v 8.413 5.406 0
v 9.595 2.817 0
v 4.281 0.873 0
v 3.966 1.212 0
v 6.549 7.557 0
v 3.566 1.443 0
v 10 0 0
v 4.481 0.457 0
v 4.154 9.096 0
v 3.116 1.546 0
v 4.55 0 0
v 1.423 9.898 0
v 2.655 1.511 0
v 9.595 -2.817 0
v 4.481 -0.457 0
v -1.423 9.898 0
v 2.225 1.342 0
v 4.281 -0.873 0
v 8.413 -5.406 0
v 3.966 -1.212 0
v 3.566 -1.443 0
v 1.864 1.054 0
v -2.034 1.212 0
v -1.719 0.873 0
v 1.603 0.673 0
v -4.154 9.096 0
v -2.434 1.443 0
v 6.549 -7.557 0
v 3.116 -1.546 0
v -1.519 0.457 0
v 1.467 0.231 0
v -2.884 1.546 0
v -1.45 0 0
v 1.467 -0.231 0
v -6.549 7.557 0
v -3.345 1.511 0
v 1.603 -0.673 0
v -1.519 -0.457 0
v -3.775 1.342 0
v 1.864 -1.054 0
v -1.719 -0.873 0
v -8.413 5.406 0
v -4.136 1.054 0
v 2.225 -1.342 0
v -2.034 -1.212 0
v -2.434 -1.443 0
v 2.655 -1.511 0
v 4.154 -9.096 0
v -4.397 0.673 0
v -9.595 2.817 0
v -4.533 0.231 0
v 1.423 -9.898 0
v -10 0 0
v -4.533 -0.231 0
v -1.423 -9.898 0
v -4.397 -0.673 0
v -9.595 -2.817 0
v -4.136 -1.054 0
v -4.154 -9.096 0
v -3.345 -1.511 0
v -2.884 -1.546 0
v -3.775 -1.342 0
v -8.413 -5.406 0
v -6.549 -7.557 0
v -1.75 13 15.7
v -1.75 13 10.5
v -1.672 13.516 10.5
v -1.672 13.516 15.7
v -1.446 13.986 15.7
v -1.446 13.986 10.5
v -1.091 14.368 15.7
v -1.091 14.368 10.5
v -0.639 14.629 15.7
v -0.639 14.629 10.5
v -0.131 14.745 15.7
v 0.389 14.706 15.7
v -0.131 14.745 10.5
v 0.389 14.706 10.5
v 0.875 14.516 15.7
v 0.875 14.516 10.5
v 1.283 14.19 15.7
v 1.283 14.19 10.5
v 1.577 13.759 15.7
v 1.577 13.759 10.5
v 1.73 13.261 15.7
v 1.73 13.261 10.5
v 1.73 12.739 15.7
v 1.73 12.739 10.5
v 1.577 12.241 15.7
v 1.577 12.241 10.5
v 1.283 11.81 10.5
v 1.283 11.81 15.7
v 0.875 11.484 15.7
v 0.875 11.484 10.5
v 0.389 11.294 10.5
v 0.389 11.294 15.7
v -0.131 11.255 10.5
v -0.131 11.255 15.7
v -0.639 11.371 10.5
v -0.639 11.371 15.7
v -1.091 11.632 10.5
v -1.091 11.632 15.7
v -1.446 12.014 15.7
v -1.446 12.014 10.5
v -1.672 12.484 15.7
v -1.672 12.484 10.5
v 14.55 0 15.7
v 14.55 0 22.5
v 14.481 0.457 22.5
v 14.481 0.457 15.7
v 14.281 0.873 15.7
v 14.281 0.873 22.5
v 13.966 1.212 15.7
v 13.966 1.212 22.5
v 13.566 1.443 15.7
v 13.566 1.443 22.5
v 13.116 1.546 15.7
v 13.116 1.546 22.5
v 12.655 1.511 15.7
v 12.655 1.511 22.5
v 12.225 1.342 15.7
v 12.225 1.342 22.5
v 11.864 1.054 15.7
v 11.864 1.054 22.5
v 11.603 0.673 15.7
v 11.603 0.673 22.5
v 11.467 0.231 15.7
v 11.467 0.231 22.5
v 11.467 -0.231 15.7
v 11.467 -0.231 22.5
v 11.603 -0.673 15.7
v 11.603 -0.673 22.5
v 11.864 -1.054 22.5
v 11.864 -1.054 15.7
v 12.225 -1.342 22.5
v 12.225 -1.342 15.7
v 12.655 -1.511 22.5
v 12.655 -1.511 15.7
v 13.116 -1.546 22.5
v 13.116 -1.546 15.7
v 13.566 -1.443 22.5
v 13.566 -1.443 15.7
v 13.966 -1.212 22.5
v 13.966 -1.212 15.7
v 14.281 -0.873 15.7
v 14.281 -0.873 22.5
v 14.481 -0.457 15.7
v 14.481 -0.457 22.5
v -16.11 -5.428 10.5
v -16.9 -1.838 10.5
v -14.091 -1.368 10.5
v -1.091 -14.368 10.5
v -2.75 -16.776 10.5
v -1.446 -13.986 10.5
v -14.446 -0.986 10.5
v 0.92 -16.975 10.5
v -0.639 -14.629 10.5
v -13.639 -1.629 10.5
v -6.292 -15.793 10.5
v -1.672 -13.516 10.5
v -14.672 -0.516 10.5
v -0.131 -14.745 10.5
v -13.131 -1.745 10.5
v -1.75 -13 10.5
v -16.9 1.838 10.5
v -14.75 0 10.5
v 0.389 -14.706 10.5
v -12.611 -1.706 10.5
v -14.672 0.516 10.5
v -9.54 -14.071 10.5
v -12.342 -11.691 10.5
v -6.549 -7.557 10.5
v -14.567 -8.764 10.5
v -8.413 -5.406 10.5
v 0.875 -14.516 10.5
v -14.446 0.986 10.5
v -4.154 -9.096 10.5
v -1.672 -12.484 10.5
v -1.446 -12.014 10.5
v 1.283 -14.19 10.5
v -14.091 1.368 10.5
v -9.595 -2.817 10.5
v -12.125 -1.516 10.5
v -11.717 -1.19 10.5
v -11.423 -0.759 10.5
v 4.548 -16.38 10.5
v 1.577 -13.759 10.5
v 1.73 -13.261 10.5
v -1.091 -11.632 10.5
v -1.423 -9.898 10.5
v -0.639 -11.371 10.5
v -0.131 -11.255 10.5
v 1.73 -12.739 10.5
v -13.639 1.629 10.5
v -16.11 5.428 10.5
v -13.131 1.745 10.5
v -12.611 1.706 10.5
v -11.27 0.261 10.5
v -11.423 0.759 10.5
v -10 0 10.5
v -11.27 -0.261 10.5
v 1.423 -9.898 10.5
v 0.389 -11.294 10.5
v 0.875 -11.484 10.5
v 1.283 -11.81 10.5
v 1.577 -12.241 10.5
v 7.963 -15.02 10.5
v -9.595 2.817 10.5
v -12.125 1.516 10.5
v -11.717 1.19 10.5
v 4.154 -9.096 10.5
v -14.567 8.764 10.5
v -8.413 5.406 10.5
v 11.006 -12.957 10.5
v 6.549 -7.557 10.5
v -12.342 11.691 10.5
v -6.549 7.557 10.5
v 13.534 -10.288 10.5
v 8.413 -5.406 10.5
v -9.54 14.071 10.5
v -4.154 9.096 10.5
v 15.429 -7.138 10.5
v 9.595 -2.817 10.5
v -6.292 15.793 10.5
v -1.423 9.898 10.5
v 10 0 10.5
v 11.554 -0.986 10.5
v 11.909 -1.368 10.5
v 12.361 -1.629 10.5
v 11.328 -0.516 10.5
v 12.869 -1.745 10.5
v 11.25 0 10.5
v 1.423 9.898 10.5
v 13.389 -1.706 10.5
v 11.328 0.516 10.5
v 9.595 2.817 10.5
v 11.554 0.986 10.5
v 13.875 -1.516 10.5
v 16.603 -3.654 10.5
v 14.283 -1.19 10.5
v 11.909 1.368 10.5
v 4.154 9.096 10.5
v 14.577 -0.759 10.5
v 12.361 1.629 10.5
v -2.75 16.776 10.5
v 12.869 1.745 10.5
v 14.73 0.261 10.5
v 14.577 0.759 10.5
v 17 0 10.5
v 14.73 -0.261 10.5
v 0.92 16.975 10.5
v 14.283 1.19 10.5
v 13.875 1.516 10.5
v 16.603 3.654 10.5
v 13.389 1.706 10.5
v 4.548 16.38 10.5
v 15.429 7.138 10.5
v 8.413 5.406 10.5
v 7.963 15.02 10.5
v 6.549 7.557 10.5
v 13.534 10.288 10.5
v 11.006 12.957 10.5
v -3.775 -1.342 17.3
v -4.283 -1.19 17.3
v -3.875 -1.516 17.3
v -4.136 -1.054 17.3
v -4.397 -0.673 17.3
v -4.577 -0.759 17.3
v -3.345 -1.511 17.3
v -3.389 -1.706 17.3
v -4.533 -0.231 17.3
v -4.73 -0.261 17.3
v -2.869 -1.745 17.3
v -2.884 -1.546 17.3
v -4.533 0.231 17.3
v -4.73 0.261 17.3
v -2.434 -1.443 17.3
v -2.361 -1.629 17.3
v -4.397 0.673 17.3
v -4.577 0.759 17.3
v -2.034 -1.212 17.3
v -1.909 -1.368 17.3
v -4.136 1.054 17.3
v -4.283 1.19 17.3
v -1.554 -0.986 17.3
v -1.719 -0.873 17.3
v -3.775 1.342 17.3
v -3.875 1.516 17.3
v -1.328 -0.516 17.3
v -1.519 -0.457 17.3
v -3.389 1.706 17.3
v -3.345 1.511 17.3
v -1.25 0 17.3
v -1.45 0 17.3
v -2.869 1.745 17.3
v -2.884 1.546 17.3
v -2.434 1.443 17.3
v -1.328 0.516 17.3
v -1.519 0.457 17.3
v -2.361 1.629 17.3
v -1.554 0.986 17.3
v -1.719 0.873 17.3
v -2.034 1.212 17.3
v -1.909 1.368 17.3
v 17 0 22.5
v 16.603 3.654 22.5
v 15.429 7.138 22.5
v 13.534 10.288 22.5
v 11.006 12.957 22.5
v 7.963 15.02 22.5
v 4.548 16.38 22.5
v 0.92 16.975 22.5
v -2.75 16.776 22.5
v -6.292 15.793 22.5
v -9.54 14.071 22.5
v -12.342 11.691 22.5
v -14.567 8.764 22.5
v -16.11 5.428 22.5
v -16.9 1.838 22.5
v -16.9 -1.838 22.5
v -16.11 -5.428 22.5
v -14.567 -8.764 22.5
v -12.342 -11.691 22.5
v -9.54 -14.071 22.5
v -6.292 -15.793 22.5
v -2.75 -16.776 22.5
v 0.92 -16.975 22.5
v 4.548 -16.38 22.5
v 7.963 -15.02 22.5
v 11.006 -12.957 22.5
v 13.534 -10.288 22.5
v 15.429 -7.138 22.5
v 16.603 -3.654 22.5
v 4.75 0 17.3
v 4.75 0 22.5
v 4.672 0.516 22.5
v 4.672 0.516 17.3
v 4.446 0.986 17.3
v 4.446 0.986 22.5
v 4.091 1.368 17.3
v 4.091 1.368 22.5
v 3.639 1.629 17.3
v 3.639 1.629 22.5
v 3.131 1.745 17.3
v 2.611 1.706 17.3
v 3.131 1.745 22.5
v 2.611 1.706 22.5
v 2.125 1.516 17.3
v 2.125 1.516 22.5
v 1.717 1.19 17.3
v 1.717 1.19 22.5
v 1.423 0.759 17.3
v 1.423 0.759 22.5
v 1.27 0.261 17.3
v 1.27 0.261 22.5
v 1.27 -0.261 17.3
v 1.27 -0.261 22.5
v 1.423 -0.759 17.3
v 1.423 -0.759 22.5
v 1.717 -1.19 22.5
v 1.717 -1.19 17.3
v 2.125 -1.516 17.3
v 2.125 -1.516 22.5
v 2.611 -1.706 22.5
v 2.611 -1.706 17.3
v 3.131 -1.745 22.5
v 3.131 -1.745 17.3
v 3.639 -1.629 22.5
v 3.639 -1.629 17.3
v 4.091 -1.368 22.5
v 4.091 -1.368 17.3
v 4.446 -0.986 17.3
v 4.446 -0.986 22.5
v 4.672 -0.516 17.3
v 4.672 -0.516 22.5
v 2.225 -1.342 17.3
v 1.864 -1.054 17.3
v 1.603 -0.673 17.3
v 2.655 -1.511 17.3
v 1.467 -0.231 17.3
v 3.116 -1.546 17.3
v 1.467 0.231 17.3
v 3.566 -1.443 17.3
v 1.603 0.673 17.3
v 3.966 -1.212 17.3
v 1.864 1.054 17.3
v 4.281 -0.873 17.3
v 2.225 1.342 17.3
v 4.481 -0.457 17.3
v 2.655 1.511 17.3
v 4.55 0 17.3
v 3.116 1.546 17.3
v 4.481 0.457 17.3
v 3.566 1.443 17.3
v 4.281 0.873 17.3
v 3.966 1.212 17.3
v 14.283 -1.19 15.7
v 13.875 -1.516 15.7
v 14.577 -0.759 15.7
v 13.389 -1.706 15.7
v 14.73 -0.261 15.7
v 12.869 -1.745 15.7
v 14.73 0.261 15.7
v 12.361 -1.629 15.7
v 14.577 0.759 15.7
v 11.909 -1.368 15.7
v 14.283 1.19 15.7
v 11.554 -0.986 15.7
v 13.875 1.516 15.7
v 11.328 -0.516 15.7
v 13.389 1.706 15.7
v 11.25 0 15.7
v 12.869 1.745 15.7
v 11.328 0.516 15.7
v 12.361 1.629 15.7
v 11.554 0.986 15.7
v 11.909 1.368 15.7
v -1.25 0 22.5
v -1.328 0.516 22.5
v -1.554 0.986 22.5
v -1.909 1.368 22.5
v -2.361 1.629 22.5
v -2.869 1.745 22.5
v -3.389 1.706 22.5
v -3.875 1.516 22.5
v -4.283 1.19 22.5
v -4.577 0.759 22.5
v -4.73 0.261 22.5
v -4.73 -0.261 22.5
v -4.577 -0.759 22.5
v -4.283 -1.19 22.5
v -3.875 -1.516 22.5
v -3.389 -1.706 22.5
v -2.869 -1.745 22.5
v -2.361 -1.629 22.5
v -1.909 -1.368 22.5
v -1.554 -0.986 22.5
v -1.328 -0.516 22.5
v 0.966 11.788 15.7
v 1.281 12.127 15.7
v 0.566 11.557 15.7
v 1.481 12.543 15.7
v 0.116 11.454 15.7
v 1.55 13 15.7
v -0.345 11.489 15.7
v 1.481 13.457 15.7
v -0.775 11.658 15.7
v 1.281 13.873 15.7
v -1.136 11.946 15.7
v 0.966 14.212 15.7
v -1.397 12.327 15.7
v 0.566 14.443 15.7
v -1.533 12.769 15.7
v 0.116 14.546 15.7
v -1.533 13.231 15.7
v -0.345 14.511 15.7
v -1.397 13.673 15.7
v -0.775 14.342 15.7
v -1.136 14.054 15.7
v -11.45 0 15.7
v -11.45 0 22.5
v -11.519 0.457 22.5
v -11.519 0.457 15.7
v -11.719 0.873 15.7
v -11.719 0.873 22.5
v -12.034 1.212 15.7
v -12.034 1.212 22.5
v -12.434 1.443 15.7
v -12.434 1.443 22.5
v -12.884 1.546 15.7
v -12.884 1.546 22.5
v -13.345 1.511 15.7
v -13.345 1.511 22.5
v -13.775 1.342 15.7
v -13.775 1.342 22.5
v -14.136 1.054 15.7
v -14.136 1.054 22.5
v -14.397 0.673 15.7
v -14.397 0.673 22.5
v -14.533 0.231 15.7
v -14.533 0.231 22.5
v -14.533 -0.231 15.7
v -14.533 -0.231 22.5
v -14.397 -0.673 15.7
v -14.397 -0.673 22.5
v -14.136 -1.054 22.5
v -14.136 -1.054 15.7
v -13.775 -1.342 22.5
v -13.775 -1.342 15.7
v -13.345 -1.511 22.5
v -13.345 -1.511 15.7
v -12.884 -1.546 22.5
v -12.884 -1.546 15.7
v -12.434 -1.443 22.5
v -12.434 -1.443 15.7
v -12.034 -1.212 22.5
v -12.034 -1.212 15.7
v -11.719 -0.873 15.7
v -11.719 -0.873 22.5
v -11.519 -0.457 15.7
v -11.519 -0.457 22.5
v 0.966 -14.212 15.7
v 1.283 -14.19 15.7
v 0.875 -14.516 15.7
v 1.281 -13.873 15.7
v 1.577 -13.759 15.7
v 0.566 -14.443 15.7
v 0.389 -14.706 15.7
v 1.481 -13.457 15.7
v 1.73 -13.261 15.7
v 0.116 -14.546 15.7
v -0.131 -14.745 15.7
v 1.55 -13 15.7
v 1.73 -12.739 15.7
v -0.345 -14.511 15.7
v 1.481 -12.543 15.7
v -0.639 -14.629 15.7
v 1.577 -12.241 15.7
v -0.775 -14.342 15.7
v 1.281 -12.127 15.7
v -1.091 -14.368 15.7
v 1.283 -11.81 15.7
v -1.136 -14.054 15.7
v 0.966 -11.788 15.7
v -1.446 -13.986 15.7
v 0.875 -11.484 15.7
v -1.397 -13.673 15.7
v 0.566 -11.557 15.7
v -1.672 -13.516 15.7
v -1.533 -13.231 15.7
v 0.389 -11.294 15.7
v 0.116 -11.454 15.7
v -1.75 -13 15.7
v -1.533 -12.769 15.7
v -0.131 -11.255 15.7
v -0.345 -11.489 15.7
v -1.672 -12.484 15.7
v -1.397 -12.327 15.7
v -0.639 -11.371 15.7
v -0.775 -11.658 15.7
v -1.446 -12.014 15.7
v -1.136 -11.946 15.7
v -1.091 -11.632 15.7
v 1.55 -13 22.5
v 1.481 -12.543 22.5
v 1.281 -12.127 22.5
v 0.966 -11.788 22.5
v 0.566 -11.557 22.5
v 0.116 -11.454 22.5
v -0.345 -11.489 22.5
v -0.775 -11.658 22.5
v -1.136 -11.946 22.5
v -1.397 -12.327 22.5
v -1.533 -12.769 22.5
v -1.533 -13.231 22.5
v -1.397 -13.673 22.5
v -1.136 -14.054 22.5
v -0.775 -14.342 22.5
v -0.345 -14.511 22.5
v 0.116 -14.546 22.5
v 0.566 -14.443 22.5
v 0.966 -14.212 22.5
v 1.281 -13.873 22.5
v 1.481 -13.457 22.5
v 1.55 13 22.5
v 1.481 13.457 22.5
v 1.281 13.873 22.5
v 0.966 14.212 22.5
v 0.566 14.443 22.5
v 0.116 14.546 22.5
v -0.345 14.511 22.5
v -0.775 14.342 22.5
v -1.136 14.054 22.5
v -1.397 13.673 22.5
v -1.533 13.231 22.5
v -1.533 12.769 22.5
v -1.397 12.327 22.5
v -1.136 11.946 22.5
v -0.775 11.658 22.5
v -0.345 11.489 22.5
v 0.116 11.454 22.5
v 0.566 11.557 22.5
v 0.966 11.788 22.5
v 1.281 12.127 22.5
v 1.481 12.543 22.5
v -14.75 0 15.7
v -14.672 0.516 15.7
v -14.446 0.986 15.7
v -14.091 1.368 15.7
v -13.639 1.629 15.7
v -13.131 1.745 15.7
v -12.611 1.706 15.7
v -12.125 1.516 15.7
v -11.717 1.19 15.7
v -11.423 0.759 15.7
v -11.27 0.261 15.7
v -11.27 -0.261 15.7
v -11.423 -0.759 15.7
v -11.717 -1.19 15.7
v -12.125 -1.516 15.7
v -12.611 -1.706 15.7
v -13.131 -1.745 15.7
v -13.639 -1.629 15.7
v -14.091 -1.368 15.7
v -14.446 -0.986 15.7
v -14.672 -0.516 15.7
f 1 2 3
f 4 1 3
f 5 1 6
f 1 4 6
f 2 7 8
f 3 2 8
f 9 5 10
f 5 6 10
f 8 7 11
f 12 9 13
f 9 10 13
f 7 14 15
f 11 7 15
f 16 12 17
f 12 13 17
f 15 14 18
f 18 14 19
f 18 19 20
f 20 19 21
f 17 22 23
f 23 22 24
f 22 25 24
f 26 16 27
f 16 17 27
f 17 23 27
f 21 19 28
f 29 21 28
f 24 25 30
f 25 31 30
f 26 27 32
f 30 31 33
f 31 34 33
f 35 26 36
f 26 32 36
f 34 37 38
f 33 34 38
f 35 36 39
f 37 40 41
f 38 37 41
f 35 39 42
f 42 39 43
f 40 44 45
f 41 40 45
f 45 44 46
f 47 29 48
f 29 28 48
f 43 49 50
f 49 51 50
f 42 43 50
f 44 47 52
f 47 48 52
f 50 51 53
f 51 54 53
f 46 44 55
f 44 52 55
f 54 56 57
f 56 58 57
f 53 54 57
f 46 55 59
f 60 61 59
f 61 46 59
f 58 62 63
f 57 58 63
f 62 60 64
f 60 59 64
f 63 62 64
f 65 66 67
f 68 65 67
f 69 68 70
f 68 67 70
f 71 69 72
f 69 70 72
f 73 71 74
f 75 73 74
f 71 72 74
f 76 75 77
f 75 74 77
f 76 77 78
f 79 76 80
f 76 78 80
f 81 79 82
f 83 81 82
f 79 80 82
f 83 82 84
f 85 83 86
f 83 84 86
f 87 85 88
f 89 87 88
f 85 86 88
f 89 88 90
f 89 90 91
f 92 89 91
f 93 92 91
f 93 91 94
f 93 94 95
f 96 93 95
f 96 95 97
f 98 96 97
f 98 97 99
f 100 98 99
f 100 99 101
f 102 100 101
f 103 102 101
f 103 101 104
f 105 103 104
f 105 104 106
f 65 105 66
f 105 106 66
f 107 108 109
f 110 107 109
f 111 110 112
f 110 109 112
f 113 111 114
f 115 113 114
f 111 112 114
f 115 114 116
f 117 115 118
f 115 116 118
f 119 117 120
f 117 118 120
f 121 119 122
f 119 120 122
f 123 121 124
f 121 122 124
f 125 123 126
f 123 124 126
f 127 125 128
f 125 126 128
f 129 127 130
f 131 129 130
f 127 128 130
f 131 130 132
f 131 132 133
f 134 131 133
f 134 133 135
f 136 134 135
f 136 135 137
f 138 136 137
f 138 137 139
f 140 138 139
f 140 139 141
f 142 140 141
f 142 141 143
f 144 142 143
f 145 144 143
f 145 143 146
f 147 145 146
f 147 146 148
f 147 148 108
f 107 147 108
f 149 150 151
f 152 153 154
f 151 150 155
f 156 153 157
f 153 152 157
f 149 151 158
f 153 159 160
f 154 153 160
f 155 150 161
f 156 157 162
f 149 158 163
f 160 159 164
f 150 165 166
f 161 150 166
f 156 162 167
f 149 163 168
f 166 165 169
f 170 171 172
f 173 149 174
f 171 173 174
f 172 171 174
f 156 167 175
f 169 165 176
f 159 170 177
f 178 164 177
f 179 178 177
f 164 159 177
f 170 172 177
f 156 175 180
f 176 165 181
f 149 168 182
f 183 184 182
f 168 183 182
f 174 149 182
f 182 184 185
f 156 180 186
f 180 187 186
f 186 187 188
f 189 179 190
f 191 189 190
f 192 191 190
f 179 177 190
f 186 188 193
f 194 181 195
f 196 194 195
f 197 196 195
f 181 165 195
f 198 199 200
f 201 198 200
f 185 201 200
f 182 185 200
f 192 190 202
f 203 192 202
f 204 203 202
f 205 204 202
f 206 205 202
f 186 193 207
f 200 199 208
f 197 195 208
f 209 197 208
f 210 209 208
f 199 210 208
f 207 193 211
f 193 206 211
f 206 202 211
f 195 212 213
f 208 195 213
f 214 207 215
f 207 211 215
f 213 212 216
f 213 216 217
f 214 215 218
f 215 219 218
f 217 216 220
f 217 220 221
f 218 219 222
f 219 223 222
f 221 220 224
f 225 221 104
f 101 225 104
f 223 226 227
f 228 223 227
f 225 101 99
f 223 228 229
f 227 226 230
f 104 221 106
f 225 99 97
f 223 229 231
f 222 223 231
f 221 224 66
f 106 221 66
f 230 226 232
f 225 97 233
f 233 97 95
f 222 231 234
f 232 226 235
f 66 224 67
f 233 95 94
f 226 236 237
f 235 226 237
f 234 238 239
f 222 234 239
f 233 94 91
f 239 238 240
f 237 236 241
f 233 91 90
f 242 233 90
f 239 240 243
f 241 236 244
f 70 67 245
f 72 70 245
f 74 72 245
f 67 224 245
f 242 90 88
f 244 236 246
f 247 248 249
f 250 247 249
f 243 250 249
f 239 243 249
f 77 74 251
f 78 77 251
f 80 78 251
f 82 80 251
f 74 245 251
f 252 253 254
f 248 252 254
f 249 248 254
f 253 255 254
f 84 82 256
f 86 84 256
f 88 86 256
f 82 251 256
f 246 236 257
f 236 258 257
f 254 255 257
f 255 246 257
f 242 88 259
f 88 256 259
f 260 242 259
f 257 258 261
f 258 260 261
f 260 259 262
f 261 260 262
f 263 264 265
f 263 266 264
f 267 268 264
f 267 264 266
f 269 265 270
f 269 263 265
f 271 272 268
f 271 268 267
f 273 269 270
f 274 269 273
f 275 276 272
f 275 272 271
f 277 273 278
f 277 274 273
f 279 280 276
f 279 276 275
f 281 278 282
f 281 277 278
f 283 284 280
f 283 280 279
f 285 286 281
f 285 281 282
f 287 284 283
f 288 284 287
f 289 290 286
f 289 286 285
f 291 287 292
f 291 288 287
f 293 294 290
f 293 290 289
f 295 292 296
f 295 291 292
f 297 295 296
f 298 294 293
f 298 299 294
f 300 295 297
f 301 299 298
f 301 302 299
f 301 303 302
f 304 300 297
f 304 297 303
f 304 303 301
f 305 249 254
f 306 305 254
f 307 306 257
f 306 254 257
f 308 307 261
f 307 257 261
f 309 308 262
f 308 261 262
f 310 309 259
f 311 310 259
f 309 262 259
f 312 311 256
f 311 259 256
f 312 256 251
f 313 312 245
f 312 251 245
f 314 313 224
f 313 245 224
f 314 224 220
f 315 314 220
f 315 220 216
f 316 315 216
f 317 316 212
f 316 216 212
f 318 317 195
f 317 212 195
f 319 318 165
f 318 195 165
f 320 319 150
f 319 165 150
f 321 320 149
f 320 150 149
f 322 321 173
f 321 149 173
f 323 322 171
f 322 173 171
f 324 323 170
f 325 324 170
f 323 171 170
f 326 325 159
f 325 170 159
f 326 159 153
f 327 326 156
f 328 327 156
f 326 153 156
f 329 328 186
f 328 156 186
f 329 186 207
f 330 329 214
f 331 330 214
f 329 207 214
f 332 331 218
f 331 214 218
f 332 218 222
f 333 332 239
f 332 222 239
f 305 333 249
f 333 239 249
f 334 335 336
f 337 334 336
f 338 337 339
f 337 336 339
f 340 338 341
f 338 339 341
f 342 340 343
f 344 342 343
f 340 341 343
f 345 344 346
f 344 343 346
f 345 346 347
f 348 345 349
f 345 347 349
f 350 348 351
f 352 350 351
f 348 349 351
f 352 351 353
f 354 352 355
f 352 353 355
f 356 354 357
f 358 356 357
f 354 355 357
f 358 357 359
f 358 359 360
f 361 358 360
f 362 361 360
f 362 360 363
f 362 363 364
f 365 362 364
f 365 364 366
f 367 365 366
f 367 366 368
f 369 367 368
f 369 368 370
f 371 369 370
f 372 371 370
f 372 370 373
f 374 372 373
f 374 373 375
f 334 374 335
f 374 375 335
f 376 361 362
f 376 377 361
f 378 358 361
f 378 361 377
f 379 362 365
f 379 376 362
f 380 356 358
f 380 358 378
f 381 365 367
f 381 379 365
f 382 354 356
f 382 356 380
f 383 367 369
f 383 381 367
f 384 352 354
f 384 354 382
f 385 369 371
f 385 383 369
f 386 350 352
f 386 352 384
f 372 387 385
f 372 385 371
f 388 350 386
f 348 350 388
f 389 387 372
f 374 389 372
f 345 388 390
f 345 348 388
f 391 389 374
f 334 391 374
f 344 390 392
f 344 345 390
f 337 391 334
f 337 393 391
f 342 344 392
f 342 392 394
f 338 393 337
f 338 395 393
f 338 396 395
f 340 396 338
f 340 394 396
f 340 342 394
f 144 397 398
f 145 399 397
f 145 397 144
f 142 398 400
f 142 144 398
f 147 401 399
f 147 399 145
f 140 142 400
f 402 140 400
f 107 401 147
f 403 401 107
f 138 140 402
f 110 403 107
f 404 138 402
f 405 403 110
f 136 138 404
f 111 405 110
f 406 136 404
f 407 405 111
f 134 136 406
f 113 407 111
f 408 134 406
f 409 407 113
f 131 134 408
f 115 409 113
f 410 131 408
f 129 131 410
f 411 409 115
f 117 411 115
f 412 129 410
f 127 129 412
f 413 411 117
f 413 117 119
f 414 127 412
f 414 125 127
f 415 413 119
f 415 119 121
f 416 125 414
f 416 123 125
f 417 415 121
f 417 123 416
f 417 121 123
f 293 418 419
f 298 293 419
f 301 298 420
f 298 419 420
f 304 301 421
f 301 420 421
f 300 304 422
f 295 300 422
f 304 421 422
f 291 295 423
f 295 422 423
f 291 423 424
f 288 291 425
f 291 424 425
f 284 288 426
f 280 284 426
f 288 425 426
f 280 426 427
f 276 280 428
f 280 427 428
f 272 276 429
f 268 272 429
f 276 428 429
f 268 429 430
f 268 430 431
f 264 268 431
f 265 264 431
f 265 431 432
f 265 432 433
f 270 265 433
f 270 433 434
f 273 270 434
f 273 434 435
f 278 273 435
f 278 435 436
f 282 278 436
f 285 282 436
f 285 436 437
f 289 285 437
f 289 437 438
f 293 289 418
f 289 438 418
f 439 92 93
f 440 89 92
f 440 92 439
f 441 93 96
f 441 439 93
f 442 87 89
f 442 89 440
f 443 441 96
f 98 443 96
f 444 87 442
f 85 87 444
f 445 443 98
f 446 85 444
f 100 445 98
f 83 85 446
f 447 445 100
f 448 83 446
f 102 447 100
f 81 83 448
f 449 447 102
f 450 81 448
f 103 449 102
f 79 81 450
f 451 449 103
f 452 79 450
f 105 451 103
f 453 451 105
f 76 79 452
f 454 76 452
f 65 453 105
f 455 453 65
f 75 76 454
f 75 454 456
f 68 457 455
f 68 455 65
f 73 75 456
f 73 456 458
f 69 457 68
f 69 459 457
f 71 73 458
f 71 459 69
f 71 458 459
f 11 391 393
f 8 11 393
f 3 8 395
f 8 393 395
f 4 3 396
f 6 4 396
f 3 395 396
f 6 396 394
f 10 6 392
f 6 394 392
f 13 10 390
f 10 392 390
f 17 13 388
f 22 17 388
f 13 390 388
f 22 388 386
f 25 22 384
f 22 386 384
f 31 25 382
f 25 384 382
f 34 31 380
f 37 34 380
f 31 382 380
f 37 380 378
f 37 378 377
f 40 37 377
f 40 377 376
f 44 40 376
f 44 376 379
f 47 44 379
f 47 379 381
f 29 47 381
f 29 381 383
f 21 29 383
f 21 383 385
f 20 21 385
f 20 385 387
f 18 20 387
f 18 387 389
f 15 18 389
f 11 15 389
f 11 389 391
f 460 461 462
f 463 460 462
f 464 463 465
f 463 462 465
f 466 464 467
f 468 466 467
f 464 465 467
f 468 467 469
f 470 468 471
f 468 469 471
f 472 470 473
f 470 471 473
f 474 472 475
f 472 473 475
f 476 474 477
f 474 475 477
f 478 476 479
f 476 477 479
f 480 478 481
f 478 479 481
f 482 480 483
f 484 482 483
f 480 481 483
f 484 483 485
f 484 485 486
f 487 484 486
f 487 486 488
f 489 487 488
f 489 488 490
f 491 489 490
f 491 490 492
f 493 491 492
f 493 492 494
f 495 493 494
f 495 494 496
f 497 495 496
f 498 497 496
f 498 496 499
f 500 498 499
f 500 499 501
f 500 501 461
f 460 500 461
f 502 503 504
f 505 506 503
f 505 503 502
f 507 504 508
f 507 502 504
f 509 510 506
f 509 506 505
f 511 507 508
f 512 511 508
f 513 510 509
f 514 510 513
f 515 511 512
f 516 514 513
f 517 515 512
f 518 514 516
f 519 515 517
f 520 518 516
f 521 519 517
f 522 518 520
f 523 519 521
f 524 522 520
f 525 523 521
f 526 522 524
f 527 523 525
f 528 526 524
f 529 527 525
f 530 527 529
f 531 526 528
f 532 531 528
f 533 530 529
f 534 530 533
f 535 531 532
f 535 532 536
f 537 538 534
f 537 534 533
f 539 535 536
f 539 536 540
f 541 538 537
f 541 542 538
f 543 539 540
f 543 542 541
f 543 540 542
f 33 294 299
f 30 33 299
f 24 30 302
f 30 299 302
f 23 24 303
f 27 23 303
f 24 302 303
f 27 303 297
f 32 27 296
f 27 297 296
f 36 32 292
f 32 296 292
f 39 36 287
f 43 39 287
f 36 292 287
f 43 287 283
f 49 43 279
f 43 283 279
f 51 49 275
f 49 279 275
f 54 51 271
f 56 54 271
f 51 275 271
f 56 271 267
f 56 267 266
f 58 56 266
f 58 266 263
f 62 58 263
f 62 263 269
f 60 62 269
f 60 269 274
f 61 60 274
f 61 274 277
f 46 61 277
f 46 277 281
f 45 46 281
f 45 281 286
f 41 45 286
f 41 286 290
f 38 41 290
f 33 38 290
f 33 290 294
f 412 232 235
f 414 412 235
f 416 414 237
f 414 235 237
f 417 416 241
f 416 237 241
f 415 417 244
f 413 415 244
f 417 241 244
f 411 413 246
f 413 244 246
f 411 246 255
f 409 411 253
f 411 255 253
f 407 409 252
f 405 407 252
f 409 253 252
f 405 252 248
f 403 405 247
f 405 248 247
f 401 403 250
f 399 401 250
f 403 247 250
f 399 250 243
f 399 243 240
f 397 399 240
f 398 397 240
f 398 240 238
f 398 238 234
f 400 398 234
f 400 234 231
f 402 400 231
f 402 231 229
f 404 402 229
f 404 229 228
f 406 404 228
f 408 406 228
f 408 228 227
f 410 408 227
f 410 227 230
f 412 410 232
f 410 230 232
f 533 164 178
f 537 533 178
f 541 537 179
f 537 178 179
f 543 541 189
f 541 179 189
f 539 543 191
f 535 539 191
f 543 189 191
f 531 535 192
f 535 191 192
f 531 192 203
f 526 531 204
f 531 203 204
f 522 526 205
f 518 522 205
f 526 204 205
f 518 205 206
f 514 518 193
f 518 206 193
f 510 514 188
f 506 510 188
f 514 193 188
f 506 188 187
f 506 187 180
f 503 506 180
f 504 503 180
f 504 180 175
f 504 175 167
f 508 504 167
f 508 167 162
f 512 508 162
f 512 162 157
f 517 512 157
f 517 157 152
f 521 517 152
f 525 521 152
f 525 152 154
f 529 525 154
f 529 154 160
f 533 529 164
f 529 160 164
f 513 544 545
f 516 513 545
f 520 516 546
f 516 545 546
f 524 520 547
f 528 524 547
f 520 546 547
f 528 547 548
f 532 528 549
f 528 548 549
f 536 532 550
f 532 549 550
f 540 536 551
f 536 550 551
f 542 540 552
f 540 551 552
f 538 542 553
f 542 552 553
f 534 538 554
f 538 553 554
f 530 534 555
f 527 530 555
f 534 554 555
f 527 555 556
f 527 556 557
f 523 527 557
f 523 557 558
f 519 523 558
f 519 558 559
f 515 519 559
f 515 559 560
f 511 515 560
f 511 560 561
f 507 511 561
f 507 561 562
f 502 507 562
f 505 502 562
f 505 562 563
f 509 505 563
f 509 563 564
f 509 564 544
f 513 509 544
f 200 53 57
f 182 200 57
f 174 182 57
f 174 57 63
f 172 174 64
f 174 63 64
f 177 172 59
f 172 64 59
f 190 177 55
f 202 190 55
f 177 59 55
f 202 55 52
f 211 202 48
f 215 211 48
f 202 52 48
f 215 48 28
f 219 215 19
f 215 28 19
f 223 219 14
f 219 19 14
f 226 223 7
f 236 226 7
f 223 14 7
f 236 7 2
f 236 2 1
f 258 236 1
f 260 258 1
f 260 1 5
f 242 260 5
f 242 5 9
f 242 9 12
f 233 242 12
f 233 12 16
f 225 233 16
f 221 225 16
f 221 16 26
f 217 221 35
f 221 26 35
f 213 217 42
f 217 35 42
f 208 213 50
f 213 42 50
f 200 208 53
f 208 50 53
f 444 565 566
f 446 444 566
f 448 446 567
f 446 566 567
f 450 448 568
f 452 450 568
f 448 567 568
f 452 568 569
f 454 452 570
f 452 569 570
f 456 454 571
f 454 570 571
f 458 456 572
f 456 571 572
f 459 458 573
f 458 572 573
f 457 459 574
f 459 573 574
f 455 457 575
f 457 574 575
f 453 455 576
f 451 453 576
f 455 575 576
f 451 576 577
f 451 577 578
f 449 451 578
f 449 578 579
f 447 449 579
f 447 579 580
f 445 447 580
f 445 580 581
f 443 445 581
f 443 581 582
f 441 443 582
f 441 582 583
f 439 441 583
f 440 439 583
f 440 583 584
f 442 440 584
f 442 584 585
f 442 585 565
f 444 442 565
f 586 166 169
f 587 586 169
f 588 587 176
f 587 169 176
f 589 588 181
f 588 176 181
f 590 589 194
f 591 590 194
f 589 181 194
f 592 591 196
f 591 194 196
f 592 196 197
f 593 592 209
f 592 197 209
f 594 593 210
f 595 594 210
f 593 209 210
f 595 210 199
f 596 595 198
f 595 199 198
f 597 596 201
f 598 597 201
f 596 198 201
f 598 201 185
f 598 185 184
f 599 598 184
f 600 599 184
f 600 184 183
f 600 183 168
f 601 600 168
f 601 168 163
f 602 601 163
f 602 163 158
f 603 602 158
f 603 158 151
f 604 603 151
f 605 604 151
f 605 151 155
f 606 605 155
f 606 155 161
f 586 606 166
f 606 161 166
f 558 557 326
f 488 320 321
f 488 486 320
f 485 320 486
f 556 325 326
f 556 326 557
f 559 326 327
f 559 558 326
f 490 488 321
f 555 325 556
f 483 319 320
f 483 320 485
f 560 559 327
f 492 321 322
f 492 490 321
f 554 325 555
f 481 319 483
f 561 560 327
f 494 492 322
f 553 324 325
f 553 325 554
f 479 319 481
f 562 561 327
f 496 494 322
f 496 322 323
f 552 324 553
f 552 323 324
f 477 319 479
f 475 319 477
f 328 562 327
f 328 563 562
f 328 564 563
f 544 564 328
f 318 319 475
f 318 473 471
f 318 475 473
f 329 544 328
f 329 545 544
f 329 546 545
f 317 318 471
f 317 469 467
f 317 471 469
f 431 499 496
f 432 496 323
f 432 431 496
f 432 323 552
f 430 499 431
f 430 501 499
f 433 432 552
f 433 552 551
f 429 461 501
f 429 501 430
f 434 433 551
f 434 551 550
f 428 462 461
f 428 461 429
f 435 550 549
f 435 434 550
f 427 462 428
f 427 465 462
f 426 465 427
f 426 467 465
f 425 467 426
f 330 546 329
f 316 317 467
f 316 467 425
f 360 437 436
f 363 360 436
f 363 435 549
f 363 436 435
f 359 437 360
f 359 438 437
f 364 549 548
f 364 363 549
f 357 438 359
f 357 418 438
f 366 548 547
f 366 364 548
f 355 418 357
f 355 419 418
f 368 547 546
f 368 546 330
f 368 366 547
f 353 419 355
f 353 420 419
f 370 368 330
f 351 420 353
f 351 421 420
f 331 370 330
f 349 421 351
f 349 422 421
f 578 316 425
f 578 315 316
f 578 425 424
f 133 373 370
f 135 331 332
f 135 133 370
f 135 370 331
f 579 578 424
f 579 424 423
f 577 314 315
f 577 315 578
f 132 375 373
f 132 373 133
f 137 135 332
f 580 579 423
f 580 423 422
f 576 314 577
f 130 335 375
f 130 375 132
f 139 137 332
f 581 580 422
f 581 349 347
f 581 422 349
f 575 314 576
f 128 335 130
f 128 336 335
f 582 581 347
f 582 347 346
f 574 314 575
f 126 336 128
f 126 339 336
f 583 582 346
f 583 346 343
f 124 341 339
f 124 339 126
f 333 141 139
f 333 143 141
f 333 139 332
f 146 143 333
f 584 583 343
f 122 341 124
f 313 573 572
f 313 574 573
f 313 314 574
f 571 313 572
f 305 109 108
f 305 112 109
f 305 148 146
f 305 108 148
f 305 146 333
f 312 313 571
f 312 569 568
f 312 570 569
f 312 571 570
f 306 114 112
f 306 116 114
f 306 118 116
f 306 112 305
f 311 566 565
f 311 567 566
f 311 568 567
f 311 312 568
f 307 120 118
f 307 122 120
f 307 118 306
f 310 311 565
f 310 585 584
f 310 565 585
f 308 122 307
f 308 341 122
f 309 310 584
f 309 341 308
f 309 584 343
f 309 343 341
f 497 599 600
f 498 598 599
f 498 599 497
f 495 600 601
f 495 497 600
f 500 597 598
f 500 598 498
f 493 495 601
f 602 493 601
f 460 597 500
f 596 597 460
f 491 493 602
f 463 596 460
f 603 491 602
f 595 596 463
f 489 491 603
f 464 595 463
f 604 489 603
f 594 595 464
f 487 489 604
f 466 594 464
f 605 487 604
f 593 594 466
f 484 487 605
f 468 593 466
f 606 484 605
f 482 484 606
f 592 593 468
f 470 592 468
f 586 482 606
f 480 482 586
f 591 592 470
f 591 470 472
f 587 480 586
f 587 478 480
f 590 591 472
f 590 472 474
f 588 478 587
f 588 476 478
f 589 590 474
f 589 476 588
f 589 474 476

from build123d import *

# Parameters (mm, degrees)
SKETCH1_R           = 10
BOSS_EXTRUDE1_DEPTH = 10.5
SKETCH3_R           = 17
BOSS_EXTRUDE2_DEPTH = 12
SKETCH4_R           = 1.55
CUT_EXTRUDE3_DEPTH  = 33.927951652
SKETCH5_R           = 1.55
CUT_EXTRUDE5_DEPTH  = 33.927951652
SKETCH6_R           = 1.75
CUT_EXTRUDE6_DEPTH  = 5.2
SKETCH7_R           = 1.75
CUT_EXTRUDE7_DEPTH  = 5.2


with BuildPart() as part:
    # Sketch1 → Boss-Extrude1 (new body)
    with BuildSketch(Plane.XY):
        with Locations(Location((0, 0, 0), (0, 0, 180))):
            Circle(SKETCH1_R)
    extrude(amount=BOSS_EXTRUDE1_DEPTH)

    # Sketch3 → Boss-Extrude2 (add)
    with BuildSketch(Plane.XY.offset(10.5)):
        Circle(SKETCH3_R)
    extrude(amount=BOSS_EXTRUDE2_DEPTH)

    # Sketch4 → Cut-Extrude3 (cut, through all)
    with BuildSketch(Plane.XY.offset(22.5)):
        with Locations((3, 0)):
            Circle(SKETCH4_R)
        with Locations((-3, 0)):
            Circle(SKETCH4_R)
    extrude(amount=-CUT_EXTRUDE3_DEPTH, mode=Mode.SUBTRACT)

    # Sketch5 → Cut-Extrude5 (cut, through all)
    with BuildSketch(Plane.XY.offset(22.5)):
        with Locations((13, 0)):
            Circle(SKETCH5_R)
        with Locations((0, -13)):
            Circle(SKETCH5_R)
        with Locations((-13, 0)):
            Circle(SKETCH5_R)
        with Locations((0, 13)):
            Circle(SKETCH5_R)
    extrude(amount=-CUT_EXTRUDE5_DEPTH, mode=Mode.SUBTRACT)

    # Sketch6 → Cut-Extrude6 (cut)
    with BuildSketch(Plane(origin=(0, 0, 10.5), x_dir=(-1, 0, 0), z_dir=(0, 0, -1))):
        with Locations((13, 0)):
            Circle(SKETCH6_R)
        with Locations((0, -13)):
            Circle(SKETCH6_R)
        with Locations((-13, 0)):
            Circle(SKETCH6_R)
        with Locations((0, 13)):
            Circle(SKETCH6_R)
    extrude(amount=-CUT_EXTRUDE6_DEPTH, mode=Mode.SUBTRACT)

    # Sketch7 → Cut-Extrude7 (cut)
    with BuildSketch(Plane.XY.offset(22.5)):
        with Locations((3, 0)):
            Circle(SKETCH7_R)
        with Locations((-3, 0)):
            Circle(SKETCH7_R)
    extrude(amount=-CUT_EXTRUDE7_DEPTH, mode=Mode.SUBTRACT)


solid = part.part
